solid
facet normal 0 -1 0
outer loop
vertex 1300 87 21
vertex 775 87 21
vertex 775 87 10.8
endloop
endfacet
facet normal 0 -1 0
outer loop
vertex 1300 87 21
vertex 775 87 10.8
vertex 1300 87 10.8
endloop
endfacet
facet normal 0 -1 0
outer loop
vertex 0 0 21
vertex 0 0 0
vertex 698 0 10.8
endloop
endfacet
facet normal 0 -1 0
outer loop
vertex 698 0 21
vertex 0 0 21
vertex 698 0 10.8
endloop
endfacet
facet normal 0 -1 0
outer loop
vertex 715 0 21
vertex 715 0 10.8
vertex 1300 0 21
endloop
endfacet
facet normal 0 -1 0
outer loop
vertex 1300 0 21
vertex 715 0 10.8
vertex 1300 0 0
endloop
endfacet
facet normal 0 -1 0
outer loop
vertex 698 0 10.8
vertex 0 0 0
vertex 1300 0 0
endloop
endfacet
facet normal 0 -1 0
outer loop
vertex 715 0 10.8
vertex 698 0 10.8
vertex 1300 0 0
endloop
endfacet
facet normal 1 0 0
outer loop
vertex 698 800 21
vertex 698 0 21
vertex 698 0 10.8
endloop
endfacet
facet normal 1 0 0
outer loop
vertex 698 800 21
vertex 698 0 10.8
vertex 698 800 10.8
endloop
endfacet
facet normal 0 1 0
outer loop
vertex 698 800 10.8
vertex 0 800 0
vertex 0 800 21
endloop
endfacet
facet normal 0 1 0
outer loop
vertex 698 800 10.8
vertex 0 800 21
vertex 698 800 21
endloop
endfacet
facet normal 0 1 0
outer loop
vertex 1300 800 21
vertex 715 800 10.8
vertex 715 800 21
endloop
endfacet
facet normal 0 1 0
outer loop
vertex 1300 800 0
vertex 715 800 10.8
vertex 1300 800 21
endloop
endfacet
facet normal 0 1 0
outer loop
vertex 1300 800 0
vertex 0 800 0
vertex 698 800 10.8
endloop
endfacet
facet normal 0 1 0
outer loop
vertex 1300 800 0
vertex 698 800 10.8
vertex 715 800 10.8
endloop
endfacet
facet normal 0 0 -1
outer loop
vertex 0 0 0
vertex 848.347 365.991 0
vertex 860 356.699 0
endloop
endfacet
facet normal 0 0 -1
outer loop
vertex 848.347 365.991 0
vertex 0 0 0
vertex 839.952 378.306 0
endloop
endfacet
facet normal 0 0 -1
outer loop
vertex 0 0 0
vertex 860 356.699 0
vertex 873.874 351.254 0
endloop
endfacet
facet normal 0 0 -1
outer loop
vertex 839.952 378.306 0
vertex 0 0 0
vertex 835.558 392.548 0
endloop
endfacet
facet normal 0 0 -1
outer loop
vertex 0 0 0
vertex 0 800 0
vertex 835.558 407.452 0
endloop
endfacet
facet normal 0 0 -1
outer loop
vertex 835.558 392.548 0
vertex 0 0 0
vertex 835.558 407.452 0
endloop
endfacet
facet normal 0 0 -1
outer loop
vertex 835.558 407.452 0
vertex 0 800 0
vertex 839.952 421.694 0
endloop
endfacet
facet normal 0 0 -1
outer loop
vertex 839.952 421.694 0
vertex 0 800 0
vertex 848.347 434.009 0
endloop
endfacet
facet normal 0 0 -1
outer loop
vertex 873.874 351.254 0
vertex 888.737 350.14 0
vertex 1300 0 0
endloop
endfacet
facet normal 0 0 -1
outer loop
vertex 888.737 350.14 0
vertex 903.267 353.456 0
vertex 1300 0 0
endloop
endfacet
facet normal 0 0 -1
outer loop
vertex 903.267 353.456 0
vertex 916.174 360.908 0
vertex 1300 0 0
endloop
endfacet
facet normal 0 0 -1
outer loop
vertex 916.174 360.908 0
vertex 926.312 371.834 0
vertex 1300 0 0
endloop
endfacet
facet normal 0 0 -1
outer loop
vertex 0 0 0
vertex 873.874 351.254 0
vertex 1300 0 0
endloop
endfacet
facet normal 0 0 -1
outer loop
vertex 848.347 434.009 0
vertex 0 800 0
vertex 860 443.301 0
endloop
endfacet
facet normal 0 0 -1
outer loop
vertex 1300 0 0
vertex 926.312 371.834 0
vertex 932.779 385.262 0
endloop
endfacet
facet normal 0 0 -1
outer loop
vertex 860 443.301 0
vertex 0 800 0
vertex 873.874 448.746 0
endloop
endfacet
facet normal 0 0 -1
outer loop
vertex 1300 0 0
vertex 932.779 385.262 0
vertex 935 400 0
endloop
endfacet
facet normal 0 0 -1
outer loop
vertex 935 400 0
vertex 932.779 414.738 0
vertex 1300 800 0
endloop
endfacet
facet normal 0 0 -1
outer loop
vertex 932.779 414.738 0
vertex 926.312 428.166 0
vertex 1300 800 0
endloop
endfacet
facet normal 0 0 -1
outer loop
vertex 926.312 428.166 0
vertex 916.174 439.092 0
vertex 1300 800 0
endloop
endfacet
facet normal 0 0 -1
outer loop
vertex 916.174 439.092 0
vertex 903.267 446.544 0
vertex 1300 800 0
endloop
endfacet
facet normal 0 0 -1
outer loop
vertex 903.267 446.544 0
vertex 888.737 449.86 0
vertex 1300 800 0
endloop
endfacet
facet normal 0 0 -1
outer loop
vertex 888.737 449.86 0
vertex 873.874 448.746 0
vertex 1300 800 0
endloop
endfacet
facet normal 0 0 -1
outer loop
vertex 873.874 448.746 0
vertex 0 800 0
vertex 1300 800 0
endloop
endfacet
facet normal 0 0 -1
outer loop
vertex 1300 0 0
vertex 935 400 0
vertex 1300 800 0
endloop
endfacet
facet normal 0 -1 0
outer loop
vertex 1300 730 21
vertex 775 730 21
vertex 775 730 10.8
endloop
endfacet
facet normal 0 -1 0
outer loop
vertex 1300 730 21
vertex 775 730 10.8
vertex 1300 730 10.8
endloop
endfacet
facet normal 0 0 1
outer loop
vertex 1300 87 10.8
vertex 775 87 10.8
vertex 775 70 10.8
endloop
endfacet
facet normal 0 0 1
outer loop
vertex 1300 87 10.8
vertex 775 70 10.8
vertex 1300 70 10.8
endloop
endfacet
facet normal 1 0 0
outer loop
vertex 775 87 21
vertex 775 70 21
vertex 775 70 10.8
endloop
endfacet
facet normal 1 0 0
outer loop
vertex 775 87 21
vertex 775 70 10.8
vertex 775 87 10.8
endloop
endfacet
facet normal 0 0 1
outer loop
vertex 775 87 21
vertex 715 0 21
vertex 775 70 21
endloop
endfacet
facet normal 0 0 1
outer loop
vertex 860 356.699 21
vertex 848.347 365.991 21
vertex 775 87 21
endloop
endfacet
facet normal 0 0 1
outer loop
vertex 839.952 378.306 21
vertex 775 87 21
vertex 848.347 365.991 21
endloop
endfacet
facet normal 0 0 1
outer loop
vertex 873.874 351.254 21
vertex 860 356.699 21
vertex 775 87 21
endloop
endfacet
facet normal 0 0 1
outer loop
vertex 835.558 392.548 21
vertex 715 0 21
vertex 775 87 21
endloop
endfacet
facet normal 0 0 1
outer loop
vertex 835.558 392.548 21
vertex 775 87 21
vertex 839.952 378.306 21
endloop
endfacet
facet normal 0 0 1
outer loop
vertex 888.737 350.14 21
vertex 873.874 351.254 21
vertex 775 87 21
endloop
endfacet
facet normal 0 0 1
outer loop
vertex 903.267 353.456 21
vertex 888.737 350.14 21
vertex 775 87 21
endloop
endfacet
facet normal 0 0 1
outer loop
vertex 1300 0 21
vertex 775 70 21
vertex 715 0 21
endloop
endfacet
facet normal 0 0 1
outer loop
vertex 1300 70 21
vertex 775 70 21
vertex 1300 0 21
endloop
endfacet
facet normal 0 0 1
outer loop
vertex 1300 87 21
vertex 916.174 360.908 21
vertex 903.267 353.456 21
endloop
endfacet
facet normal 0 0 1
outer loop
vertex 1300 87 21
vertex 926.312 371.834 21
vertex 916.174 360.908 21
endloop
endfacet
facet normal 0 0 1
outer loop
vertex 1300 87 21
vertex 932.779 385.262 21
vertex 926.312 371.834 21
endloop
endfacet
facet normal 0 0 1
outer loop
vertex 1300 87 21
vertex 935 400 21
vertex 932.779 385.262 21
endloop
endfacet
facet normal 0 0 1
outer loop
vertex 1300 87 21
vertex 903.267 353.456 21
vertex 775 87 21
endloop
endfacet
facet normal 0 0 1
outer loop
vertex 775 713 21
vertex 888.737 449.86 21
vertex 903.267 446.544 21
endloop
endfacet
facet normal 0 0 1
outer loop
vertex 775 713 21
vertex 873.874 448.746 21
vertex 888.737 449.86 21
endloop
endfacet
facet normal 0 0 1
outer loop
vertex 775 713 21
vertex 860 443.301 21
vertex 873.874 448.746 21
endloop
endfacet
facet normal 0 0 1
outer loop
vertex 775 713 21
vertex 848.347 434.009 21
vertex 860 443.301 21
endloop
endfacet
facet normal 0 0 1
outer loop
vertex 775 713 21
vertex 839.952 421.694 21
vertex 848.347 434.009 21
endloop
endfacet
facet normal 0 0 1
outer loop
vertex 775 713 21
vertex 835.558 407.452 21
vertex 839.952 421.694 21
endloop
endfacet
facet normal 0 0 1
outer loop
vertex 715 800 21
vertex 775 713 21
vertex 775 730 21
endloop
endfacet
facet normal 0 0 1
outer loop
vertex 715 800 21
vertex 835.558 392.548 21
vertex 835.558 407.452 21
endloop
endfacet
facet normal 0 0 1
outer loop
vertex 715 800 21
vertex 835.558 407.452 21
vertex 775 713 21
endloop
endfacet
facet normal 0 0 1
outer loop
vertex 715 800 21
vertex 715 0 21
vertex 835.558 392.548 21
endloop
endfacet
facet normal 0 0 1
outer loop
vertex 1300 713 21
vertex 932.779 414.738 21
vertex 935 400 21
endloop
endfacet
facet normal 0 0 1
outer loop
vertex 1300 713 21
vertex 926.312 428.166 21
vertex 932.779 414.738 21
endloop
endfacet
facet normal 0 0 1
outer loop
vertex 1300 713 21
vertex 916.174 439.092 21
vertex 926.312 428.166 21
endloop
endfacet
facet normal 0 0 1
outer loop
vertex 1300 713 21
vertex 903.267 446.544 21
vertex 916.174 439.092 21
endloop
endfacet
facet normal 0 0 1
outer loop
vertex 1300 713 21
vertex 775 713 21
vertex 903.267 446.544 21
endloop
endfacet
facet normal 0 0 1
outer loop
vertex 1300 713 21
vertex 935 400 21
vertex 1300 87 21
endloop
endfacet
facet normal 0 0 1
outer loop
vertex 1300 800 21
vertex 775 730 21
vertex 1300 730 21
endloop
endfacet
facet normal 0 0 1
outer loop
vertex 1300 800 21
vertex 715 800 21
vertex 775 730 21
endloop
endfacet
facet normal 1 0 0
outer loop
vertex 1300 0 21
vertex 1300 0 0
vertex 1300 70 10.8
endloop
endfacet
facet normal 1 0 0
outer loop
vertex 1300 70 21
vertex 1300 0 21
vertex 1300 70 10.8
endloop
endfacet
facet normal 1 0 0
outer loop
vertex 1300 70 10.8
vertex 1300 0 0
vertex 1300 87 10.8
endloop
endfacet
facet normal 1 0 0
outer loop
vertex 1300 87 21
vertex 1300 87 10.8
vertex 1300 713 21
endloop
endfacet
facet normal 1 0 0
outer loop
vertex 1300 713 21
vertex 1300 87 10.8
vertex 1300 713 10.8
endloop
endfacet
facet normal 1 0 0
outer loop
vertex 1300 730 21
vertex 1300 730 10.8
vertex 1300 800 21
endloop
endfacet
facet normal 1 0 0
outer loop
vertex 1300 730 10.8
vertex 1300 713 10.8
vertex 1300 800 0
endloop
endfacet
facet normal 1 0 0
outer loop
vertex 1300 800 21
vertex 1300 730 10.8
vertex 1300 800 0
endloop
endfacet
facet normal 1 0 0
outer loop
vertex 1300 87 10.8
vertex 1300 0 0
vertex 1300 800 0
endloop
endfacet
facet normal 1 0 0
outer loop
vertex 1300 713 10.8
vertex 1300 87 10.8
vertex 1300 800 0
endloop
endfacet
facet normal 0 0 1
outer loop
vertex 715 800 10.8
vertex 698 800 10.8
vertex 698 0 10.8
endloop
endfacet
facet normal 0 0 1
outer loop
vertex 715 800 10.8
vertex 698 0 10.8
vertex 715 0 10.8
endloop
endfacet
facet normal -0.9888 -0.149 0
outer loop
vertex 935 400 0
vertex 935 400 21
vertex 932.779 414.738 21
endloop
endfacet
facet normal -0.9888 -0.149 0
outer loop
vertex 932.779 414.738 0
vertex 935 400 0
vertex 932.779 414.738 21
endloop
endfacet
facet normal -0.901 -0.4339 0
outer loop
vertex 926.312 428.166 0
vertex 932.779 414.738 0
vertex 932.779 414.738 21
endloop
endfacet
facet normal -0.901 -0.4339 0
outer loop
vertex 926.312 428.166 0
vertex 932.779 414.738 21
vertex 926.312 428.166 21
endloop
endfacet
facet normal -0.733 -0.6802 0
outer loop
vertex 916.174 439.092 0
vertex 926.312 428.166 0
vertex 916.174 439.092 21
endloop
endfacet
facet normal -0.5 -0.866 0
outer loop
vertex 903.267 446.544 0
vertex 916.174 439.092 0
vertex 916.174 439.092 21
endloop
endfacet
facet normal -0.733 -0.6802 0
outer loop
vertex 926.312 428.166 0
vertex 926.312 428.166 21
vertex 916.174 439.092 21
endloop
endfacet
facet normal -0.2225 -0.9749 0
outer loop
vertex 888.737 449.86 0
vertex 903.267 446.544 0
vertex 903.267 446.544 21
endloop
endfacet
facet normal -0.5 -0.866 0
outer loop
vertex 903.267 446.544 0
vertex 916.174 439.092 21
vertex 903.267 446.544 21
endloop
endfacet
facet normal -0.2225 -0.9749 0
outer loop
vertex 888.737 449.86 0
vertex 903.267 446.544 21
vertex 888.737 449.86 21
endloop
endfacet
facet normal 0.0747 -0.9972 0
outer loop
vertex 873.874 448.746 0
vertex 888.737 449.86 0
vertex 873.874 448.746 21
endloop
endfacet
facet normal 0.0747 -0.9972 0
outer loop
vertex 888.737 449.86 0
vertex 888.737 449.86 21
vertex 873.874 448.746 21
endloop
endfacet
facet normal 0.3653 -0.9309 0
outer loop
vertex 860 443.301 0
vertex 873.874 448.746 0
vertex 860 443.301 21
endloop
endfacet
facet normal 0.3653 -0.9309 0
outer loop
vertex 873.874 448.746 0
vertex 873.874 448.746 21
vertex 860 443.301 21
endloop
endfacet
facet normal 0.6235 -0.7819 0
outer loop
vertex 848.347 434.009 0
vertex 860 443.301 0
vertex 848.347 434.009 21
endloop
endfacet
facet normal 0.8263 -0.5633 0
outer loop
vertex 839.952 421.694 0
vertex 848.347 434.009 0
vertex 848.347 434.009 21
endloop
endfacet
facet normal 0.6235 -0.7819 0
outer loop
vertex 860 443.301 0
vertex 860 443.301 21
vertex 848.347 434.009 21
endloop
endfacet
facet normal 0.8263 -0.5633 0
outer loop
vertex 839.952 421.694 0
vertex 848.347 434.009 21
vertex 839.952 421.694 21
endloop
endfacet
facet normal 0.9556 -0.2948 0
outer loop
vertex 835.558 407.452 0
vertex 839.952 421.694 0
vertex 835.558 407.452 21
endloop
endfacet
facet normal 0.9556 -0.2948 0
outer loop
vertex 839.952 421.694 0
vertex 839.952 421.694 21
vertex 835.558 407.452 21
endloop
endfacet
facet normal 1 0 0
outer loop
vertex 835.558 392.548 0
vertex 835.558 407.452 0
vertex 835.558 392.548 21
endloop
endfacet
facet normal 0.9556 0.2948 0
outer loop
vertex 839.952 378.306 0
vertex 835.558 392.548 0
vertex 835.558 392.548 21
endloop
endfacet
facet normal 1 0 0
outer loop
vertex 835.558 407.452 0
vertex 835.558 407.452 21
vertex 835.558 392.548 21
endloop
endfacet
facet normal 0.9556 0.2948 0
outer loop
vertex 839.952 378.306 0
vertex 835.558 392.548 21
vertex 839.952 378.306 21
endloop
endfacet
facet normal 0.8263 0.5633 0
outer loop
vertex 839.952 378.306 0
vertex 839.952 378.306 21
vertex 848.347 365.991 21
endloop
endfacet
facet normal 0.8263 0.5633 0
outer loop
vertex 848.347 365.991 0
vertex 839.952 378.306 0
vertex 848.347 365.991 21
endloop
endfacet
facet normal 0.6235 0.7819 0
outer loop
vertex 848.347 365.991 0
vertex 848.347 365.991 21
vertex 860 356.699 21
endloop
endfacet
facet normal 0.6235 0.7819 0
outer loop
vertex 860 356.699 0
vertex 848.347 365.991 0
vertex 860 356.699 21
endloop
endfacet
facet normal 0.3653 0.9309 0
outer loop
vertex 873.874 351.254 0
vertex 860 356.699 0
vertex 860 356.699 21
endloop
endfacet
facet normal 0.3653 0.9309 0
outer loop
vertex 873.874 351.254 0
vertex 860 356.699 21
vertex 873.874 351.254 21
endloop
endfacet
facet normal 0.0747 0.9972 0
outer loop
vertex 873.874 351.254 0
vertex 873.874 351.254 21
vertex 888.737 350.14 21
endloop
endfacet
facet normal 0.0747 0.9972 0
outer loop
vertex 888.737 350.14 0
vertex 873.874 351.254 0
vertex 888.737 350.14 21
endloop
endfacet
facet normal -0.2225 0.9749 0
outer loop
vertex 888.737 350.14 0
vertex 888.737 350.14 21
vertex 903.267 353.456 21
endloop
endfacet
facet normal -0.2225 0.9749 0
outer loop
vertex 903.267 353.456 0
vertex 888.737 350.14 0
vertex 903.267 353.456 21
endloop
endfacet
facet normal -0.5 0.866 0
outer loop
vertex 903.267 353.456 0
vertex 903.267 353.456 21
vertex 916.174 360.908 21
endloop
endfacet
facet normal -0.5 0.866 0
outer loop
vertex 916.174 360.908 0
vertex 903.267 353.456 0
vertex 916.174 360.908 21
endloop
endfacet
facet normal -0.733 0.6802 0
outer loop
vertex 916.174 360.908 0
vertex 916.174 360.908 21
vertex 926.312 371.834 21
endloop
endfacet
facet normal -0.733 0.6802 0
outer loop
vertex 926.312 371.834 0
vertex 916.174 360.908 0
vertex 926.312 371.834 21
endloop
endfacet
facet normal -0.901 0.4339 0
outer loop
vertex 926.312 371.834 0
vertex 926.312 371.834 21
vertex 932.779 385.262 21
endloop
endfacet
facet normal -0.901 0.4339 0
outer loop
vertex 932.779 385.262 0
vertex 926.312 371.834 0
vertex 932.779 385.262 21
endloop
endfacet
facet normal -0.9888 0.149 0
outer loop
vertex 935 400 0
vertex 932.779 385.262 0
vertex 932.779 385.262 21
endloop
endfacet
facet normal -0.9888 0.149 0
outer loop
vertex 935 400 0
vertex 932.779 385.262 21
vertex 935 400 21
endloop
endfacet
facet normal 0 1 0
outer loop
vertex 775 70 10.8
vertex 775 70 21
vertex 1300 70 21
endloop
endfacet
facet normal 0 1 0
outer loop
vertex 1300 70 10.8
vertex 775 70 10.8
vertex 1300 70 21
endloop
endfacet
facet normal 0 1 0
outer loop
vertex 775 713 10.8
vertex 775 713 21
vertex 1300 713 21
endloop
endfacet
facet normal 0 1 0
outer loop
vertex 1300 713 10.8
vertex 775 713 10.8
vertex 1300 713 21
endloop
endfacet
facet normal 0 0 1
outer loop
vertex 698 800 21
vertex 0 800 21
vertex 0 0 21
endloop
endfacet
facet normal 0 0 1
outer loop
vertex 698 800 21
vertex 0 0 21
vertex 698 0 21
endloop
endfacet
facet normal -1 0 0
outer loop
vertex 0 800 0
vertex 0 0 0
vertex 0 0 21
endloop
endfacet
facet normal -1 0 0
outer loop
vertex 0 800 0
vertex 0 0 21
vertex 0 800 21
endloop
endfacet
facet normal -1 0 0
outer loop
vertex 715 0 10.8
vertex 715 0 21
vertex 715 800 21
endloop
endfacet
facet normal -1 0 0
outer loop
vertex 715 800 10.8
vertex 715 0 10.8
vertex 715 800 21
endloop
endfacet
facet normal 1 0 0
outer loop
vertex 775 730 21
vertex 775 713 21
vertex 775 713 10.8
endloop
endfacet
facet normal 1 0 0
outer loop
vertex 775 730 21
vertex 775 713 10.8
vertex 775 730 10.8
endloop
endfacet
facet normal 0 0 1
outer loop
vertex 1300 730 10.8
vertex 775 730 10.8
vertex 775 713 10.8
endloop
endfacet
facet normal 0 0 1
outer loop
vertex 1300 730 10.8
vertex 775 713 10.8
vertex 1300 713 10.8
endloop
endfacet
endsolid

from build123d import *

# Parameters (mm, degrees)
F0_W     = 1300
F0_H     = 800
F1_DEPTH = 21
F2_W     = 17
F2_H     = 800
F2_W_2   = 525
F2_H_2   = 17
F3_DEPTH = 10.2
F4_R     = 50
F5_DEPTH = 25


with BuildPart() as f1:
    # F0 (on Top) → F1 (new body)
    with BuildSketch(Plane.XY):
        with Locations((650, 400)):
            Rectangle(F0_W, F0_H)
    extrude(amount=F1_DEPTH)

    # F2 (on face) → F3 (cut)
    with BuildSketch(Plane.XY.offset(21)):
        with Locations((706.5, 400)):
            Rectangle(F2_W, F2_H)
        with Locations((1037.5, 721.5)):
            Rectangle(F2_W_2, F2_H_2)
        with Locations((1037.5, 78.5)):
            Rectangle(F2_W_2, F2_H_2)
    extrude(amount=-F3_DEPTH, mode=Mode.SUBTRACT)

    # F4 (on face) → F5 (cut)
    with BuildSketch(Plane.XY.offset(21)):
        with Locations((885, 400)):
            Circle(F4_R)
    extrude(amount=-F5_DEPTH, mode=Mode.SUBTRACT)


solid = f1.part
